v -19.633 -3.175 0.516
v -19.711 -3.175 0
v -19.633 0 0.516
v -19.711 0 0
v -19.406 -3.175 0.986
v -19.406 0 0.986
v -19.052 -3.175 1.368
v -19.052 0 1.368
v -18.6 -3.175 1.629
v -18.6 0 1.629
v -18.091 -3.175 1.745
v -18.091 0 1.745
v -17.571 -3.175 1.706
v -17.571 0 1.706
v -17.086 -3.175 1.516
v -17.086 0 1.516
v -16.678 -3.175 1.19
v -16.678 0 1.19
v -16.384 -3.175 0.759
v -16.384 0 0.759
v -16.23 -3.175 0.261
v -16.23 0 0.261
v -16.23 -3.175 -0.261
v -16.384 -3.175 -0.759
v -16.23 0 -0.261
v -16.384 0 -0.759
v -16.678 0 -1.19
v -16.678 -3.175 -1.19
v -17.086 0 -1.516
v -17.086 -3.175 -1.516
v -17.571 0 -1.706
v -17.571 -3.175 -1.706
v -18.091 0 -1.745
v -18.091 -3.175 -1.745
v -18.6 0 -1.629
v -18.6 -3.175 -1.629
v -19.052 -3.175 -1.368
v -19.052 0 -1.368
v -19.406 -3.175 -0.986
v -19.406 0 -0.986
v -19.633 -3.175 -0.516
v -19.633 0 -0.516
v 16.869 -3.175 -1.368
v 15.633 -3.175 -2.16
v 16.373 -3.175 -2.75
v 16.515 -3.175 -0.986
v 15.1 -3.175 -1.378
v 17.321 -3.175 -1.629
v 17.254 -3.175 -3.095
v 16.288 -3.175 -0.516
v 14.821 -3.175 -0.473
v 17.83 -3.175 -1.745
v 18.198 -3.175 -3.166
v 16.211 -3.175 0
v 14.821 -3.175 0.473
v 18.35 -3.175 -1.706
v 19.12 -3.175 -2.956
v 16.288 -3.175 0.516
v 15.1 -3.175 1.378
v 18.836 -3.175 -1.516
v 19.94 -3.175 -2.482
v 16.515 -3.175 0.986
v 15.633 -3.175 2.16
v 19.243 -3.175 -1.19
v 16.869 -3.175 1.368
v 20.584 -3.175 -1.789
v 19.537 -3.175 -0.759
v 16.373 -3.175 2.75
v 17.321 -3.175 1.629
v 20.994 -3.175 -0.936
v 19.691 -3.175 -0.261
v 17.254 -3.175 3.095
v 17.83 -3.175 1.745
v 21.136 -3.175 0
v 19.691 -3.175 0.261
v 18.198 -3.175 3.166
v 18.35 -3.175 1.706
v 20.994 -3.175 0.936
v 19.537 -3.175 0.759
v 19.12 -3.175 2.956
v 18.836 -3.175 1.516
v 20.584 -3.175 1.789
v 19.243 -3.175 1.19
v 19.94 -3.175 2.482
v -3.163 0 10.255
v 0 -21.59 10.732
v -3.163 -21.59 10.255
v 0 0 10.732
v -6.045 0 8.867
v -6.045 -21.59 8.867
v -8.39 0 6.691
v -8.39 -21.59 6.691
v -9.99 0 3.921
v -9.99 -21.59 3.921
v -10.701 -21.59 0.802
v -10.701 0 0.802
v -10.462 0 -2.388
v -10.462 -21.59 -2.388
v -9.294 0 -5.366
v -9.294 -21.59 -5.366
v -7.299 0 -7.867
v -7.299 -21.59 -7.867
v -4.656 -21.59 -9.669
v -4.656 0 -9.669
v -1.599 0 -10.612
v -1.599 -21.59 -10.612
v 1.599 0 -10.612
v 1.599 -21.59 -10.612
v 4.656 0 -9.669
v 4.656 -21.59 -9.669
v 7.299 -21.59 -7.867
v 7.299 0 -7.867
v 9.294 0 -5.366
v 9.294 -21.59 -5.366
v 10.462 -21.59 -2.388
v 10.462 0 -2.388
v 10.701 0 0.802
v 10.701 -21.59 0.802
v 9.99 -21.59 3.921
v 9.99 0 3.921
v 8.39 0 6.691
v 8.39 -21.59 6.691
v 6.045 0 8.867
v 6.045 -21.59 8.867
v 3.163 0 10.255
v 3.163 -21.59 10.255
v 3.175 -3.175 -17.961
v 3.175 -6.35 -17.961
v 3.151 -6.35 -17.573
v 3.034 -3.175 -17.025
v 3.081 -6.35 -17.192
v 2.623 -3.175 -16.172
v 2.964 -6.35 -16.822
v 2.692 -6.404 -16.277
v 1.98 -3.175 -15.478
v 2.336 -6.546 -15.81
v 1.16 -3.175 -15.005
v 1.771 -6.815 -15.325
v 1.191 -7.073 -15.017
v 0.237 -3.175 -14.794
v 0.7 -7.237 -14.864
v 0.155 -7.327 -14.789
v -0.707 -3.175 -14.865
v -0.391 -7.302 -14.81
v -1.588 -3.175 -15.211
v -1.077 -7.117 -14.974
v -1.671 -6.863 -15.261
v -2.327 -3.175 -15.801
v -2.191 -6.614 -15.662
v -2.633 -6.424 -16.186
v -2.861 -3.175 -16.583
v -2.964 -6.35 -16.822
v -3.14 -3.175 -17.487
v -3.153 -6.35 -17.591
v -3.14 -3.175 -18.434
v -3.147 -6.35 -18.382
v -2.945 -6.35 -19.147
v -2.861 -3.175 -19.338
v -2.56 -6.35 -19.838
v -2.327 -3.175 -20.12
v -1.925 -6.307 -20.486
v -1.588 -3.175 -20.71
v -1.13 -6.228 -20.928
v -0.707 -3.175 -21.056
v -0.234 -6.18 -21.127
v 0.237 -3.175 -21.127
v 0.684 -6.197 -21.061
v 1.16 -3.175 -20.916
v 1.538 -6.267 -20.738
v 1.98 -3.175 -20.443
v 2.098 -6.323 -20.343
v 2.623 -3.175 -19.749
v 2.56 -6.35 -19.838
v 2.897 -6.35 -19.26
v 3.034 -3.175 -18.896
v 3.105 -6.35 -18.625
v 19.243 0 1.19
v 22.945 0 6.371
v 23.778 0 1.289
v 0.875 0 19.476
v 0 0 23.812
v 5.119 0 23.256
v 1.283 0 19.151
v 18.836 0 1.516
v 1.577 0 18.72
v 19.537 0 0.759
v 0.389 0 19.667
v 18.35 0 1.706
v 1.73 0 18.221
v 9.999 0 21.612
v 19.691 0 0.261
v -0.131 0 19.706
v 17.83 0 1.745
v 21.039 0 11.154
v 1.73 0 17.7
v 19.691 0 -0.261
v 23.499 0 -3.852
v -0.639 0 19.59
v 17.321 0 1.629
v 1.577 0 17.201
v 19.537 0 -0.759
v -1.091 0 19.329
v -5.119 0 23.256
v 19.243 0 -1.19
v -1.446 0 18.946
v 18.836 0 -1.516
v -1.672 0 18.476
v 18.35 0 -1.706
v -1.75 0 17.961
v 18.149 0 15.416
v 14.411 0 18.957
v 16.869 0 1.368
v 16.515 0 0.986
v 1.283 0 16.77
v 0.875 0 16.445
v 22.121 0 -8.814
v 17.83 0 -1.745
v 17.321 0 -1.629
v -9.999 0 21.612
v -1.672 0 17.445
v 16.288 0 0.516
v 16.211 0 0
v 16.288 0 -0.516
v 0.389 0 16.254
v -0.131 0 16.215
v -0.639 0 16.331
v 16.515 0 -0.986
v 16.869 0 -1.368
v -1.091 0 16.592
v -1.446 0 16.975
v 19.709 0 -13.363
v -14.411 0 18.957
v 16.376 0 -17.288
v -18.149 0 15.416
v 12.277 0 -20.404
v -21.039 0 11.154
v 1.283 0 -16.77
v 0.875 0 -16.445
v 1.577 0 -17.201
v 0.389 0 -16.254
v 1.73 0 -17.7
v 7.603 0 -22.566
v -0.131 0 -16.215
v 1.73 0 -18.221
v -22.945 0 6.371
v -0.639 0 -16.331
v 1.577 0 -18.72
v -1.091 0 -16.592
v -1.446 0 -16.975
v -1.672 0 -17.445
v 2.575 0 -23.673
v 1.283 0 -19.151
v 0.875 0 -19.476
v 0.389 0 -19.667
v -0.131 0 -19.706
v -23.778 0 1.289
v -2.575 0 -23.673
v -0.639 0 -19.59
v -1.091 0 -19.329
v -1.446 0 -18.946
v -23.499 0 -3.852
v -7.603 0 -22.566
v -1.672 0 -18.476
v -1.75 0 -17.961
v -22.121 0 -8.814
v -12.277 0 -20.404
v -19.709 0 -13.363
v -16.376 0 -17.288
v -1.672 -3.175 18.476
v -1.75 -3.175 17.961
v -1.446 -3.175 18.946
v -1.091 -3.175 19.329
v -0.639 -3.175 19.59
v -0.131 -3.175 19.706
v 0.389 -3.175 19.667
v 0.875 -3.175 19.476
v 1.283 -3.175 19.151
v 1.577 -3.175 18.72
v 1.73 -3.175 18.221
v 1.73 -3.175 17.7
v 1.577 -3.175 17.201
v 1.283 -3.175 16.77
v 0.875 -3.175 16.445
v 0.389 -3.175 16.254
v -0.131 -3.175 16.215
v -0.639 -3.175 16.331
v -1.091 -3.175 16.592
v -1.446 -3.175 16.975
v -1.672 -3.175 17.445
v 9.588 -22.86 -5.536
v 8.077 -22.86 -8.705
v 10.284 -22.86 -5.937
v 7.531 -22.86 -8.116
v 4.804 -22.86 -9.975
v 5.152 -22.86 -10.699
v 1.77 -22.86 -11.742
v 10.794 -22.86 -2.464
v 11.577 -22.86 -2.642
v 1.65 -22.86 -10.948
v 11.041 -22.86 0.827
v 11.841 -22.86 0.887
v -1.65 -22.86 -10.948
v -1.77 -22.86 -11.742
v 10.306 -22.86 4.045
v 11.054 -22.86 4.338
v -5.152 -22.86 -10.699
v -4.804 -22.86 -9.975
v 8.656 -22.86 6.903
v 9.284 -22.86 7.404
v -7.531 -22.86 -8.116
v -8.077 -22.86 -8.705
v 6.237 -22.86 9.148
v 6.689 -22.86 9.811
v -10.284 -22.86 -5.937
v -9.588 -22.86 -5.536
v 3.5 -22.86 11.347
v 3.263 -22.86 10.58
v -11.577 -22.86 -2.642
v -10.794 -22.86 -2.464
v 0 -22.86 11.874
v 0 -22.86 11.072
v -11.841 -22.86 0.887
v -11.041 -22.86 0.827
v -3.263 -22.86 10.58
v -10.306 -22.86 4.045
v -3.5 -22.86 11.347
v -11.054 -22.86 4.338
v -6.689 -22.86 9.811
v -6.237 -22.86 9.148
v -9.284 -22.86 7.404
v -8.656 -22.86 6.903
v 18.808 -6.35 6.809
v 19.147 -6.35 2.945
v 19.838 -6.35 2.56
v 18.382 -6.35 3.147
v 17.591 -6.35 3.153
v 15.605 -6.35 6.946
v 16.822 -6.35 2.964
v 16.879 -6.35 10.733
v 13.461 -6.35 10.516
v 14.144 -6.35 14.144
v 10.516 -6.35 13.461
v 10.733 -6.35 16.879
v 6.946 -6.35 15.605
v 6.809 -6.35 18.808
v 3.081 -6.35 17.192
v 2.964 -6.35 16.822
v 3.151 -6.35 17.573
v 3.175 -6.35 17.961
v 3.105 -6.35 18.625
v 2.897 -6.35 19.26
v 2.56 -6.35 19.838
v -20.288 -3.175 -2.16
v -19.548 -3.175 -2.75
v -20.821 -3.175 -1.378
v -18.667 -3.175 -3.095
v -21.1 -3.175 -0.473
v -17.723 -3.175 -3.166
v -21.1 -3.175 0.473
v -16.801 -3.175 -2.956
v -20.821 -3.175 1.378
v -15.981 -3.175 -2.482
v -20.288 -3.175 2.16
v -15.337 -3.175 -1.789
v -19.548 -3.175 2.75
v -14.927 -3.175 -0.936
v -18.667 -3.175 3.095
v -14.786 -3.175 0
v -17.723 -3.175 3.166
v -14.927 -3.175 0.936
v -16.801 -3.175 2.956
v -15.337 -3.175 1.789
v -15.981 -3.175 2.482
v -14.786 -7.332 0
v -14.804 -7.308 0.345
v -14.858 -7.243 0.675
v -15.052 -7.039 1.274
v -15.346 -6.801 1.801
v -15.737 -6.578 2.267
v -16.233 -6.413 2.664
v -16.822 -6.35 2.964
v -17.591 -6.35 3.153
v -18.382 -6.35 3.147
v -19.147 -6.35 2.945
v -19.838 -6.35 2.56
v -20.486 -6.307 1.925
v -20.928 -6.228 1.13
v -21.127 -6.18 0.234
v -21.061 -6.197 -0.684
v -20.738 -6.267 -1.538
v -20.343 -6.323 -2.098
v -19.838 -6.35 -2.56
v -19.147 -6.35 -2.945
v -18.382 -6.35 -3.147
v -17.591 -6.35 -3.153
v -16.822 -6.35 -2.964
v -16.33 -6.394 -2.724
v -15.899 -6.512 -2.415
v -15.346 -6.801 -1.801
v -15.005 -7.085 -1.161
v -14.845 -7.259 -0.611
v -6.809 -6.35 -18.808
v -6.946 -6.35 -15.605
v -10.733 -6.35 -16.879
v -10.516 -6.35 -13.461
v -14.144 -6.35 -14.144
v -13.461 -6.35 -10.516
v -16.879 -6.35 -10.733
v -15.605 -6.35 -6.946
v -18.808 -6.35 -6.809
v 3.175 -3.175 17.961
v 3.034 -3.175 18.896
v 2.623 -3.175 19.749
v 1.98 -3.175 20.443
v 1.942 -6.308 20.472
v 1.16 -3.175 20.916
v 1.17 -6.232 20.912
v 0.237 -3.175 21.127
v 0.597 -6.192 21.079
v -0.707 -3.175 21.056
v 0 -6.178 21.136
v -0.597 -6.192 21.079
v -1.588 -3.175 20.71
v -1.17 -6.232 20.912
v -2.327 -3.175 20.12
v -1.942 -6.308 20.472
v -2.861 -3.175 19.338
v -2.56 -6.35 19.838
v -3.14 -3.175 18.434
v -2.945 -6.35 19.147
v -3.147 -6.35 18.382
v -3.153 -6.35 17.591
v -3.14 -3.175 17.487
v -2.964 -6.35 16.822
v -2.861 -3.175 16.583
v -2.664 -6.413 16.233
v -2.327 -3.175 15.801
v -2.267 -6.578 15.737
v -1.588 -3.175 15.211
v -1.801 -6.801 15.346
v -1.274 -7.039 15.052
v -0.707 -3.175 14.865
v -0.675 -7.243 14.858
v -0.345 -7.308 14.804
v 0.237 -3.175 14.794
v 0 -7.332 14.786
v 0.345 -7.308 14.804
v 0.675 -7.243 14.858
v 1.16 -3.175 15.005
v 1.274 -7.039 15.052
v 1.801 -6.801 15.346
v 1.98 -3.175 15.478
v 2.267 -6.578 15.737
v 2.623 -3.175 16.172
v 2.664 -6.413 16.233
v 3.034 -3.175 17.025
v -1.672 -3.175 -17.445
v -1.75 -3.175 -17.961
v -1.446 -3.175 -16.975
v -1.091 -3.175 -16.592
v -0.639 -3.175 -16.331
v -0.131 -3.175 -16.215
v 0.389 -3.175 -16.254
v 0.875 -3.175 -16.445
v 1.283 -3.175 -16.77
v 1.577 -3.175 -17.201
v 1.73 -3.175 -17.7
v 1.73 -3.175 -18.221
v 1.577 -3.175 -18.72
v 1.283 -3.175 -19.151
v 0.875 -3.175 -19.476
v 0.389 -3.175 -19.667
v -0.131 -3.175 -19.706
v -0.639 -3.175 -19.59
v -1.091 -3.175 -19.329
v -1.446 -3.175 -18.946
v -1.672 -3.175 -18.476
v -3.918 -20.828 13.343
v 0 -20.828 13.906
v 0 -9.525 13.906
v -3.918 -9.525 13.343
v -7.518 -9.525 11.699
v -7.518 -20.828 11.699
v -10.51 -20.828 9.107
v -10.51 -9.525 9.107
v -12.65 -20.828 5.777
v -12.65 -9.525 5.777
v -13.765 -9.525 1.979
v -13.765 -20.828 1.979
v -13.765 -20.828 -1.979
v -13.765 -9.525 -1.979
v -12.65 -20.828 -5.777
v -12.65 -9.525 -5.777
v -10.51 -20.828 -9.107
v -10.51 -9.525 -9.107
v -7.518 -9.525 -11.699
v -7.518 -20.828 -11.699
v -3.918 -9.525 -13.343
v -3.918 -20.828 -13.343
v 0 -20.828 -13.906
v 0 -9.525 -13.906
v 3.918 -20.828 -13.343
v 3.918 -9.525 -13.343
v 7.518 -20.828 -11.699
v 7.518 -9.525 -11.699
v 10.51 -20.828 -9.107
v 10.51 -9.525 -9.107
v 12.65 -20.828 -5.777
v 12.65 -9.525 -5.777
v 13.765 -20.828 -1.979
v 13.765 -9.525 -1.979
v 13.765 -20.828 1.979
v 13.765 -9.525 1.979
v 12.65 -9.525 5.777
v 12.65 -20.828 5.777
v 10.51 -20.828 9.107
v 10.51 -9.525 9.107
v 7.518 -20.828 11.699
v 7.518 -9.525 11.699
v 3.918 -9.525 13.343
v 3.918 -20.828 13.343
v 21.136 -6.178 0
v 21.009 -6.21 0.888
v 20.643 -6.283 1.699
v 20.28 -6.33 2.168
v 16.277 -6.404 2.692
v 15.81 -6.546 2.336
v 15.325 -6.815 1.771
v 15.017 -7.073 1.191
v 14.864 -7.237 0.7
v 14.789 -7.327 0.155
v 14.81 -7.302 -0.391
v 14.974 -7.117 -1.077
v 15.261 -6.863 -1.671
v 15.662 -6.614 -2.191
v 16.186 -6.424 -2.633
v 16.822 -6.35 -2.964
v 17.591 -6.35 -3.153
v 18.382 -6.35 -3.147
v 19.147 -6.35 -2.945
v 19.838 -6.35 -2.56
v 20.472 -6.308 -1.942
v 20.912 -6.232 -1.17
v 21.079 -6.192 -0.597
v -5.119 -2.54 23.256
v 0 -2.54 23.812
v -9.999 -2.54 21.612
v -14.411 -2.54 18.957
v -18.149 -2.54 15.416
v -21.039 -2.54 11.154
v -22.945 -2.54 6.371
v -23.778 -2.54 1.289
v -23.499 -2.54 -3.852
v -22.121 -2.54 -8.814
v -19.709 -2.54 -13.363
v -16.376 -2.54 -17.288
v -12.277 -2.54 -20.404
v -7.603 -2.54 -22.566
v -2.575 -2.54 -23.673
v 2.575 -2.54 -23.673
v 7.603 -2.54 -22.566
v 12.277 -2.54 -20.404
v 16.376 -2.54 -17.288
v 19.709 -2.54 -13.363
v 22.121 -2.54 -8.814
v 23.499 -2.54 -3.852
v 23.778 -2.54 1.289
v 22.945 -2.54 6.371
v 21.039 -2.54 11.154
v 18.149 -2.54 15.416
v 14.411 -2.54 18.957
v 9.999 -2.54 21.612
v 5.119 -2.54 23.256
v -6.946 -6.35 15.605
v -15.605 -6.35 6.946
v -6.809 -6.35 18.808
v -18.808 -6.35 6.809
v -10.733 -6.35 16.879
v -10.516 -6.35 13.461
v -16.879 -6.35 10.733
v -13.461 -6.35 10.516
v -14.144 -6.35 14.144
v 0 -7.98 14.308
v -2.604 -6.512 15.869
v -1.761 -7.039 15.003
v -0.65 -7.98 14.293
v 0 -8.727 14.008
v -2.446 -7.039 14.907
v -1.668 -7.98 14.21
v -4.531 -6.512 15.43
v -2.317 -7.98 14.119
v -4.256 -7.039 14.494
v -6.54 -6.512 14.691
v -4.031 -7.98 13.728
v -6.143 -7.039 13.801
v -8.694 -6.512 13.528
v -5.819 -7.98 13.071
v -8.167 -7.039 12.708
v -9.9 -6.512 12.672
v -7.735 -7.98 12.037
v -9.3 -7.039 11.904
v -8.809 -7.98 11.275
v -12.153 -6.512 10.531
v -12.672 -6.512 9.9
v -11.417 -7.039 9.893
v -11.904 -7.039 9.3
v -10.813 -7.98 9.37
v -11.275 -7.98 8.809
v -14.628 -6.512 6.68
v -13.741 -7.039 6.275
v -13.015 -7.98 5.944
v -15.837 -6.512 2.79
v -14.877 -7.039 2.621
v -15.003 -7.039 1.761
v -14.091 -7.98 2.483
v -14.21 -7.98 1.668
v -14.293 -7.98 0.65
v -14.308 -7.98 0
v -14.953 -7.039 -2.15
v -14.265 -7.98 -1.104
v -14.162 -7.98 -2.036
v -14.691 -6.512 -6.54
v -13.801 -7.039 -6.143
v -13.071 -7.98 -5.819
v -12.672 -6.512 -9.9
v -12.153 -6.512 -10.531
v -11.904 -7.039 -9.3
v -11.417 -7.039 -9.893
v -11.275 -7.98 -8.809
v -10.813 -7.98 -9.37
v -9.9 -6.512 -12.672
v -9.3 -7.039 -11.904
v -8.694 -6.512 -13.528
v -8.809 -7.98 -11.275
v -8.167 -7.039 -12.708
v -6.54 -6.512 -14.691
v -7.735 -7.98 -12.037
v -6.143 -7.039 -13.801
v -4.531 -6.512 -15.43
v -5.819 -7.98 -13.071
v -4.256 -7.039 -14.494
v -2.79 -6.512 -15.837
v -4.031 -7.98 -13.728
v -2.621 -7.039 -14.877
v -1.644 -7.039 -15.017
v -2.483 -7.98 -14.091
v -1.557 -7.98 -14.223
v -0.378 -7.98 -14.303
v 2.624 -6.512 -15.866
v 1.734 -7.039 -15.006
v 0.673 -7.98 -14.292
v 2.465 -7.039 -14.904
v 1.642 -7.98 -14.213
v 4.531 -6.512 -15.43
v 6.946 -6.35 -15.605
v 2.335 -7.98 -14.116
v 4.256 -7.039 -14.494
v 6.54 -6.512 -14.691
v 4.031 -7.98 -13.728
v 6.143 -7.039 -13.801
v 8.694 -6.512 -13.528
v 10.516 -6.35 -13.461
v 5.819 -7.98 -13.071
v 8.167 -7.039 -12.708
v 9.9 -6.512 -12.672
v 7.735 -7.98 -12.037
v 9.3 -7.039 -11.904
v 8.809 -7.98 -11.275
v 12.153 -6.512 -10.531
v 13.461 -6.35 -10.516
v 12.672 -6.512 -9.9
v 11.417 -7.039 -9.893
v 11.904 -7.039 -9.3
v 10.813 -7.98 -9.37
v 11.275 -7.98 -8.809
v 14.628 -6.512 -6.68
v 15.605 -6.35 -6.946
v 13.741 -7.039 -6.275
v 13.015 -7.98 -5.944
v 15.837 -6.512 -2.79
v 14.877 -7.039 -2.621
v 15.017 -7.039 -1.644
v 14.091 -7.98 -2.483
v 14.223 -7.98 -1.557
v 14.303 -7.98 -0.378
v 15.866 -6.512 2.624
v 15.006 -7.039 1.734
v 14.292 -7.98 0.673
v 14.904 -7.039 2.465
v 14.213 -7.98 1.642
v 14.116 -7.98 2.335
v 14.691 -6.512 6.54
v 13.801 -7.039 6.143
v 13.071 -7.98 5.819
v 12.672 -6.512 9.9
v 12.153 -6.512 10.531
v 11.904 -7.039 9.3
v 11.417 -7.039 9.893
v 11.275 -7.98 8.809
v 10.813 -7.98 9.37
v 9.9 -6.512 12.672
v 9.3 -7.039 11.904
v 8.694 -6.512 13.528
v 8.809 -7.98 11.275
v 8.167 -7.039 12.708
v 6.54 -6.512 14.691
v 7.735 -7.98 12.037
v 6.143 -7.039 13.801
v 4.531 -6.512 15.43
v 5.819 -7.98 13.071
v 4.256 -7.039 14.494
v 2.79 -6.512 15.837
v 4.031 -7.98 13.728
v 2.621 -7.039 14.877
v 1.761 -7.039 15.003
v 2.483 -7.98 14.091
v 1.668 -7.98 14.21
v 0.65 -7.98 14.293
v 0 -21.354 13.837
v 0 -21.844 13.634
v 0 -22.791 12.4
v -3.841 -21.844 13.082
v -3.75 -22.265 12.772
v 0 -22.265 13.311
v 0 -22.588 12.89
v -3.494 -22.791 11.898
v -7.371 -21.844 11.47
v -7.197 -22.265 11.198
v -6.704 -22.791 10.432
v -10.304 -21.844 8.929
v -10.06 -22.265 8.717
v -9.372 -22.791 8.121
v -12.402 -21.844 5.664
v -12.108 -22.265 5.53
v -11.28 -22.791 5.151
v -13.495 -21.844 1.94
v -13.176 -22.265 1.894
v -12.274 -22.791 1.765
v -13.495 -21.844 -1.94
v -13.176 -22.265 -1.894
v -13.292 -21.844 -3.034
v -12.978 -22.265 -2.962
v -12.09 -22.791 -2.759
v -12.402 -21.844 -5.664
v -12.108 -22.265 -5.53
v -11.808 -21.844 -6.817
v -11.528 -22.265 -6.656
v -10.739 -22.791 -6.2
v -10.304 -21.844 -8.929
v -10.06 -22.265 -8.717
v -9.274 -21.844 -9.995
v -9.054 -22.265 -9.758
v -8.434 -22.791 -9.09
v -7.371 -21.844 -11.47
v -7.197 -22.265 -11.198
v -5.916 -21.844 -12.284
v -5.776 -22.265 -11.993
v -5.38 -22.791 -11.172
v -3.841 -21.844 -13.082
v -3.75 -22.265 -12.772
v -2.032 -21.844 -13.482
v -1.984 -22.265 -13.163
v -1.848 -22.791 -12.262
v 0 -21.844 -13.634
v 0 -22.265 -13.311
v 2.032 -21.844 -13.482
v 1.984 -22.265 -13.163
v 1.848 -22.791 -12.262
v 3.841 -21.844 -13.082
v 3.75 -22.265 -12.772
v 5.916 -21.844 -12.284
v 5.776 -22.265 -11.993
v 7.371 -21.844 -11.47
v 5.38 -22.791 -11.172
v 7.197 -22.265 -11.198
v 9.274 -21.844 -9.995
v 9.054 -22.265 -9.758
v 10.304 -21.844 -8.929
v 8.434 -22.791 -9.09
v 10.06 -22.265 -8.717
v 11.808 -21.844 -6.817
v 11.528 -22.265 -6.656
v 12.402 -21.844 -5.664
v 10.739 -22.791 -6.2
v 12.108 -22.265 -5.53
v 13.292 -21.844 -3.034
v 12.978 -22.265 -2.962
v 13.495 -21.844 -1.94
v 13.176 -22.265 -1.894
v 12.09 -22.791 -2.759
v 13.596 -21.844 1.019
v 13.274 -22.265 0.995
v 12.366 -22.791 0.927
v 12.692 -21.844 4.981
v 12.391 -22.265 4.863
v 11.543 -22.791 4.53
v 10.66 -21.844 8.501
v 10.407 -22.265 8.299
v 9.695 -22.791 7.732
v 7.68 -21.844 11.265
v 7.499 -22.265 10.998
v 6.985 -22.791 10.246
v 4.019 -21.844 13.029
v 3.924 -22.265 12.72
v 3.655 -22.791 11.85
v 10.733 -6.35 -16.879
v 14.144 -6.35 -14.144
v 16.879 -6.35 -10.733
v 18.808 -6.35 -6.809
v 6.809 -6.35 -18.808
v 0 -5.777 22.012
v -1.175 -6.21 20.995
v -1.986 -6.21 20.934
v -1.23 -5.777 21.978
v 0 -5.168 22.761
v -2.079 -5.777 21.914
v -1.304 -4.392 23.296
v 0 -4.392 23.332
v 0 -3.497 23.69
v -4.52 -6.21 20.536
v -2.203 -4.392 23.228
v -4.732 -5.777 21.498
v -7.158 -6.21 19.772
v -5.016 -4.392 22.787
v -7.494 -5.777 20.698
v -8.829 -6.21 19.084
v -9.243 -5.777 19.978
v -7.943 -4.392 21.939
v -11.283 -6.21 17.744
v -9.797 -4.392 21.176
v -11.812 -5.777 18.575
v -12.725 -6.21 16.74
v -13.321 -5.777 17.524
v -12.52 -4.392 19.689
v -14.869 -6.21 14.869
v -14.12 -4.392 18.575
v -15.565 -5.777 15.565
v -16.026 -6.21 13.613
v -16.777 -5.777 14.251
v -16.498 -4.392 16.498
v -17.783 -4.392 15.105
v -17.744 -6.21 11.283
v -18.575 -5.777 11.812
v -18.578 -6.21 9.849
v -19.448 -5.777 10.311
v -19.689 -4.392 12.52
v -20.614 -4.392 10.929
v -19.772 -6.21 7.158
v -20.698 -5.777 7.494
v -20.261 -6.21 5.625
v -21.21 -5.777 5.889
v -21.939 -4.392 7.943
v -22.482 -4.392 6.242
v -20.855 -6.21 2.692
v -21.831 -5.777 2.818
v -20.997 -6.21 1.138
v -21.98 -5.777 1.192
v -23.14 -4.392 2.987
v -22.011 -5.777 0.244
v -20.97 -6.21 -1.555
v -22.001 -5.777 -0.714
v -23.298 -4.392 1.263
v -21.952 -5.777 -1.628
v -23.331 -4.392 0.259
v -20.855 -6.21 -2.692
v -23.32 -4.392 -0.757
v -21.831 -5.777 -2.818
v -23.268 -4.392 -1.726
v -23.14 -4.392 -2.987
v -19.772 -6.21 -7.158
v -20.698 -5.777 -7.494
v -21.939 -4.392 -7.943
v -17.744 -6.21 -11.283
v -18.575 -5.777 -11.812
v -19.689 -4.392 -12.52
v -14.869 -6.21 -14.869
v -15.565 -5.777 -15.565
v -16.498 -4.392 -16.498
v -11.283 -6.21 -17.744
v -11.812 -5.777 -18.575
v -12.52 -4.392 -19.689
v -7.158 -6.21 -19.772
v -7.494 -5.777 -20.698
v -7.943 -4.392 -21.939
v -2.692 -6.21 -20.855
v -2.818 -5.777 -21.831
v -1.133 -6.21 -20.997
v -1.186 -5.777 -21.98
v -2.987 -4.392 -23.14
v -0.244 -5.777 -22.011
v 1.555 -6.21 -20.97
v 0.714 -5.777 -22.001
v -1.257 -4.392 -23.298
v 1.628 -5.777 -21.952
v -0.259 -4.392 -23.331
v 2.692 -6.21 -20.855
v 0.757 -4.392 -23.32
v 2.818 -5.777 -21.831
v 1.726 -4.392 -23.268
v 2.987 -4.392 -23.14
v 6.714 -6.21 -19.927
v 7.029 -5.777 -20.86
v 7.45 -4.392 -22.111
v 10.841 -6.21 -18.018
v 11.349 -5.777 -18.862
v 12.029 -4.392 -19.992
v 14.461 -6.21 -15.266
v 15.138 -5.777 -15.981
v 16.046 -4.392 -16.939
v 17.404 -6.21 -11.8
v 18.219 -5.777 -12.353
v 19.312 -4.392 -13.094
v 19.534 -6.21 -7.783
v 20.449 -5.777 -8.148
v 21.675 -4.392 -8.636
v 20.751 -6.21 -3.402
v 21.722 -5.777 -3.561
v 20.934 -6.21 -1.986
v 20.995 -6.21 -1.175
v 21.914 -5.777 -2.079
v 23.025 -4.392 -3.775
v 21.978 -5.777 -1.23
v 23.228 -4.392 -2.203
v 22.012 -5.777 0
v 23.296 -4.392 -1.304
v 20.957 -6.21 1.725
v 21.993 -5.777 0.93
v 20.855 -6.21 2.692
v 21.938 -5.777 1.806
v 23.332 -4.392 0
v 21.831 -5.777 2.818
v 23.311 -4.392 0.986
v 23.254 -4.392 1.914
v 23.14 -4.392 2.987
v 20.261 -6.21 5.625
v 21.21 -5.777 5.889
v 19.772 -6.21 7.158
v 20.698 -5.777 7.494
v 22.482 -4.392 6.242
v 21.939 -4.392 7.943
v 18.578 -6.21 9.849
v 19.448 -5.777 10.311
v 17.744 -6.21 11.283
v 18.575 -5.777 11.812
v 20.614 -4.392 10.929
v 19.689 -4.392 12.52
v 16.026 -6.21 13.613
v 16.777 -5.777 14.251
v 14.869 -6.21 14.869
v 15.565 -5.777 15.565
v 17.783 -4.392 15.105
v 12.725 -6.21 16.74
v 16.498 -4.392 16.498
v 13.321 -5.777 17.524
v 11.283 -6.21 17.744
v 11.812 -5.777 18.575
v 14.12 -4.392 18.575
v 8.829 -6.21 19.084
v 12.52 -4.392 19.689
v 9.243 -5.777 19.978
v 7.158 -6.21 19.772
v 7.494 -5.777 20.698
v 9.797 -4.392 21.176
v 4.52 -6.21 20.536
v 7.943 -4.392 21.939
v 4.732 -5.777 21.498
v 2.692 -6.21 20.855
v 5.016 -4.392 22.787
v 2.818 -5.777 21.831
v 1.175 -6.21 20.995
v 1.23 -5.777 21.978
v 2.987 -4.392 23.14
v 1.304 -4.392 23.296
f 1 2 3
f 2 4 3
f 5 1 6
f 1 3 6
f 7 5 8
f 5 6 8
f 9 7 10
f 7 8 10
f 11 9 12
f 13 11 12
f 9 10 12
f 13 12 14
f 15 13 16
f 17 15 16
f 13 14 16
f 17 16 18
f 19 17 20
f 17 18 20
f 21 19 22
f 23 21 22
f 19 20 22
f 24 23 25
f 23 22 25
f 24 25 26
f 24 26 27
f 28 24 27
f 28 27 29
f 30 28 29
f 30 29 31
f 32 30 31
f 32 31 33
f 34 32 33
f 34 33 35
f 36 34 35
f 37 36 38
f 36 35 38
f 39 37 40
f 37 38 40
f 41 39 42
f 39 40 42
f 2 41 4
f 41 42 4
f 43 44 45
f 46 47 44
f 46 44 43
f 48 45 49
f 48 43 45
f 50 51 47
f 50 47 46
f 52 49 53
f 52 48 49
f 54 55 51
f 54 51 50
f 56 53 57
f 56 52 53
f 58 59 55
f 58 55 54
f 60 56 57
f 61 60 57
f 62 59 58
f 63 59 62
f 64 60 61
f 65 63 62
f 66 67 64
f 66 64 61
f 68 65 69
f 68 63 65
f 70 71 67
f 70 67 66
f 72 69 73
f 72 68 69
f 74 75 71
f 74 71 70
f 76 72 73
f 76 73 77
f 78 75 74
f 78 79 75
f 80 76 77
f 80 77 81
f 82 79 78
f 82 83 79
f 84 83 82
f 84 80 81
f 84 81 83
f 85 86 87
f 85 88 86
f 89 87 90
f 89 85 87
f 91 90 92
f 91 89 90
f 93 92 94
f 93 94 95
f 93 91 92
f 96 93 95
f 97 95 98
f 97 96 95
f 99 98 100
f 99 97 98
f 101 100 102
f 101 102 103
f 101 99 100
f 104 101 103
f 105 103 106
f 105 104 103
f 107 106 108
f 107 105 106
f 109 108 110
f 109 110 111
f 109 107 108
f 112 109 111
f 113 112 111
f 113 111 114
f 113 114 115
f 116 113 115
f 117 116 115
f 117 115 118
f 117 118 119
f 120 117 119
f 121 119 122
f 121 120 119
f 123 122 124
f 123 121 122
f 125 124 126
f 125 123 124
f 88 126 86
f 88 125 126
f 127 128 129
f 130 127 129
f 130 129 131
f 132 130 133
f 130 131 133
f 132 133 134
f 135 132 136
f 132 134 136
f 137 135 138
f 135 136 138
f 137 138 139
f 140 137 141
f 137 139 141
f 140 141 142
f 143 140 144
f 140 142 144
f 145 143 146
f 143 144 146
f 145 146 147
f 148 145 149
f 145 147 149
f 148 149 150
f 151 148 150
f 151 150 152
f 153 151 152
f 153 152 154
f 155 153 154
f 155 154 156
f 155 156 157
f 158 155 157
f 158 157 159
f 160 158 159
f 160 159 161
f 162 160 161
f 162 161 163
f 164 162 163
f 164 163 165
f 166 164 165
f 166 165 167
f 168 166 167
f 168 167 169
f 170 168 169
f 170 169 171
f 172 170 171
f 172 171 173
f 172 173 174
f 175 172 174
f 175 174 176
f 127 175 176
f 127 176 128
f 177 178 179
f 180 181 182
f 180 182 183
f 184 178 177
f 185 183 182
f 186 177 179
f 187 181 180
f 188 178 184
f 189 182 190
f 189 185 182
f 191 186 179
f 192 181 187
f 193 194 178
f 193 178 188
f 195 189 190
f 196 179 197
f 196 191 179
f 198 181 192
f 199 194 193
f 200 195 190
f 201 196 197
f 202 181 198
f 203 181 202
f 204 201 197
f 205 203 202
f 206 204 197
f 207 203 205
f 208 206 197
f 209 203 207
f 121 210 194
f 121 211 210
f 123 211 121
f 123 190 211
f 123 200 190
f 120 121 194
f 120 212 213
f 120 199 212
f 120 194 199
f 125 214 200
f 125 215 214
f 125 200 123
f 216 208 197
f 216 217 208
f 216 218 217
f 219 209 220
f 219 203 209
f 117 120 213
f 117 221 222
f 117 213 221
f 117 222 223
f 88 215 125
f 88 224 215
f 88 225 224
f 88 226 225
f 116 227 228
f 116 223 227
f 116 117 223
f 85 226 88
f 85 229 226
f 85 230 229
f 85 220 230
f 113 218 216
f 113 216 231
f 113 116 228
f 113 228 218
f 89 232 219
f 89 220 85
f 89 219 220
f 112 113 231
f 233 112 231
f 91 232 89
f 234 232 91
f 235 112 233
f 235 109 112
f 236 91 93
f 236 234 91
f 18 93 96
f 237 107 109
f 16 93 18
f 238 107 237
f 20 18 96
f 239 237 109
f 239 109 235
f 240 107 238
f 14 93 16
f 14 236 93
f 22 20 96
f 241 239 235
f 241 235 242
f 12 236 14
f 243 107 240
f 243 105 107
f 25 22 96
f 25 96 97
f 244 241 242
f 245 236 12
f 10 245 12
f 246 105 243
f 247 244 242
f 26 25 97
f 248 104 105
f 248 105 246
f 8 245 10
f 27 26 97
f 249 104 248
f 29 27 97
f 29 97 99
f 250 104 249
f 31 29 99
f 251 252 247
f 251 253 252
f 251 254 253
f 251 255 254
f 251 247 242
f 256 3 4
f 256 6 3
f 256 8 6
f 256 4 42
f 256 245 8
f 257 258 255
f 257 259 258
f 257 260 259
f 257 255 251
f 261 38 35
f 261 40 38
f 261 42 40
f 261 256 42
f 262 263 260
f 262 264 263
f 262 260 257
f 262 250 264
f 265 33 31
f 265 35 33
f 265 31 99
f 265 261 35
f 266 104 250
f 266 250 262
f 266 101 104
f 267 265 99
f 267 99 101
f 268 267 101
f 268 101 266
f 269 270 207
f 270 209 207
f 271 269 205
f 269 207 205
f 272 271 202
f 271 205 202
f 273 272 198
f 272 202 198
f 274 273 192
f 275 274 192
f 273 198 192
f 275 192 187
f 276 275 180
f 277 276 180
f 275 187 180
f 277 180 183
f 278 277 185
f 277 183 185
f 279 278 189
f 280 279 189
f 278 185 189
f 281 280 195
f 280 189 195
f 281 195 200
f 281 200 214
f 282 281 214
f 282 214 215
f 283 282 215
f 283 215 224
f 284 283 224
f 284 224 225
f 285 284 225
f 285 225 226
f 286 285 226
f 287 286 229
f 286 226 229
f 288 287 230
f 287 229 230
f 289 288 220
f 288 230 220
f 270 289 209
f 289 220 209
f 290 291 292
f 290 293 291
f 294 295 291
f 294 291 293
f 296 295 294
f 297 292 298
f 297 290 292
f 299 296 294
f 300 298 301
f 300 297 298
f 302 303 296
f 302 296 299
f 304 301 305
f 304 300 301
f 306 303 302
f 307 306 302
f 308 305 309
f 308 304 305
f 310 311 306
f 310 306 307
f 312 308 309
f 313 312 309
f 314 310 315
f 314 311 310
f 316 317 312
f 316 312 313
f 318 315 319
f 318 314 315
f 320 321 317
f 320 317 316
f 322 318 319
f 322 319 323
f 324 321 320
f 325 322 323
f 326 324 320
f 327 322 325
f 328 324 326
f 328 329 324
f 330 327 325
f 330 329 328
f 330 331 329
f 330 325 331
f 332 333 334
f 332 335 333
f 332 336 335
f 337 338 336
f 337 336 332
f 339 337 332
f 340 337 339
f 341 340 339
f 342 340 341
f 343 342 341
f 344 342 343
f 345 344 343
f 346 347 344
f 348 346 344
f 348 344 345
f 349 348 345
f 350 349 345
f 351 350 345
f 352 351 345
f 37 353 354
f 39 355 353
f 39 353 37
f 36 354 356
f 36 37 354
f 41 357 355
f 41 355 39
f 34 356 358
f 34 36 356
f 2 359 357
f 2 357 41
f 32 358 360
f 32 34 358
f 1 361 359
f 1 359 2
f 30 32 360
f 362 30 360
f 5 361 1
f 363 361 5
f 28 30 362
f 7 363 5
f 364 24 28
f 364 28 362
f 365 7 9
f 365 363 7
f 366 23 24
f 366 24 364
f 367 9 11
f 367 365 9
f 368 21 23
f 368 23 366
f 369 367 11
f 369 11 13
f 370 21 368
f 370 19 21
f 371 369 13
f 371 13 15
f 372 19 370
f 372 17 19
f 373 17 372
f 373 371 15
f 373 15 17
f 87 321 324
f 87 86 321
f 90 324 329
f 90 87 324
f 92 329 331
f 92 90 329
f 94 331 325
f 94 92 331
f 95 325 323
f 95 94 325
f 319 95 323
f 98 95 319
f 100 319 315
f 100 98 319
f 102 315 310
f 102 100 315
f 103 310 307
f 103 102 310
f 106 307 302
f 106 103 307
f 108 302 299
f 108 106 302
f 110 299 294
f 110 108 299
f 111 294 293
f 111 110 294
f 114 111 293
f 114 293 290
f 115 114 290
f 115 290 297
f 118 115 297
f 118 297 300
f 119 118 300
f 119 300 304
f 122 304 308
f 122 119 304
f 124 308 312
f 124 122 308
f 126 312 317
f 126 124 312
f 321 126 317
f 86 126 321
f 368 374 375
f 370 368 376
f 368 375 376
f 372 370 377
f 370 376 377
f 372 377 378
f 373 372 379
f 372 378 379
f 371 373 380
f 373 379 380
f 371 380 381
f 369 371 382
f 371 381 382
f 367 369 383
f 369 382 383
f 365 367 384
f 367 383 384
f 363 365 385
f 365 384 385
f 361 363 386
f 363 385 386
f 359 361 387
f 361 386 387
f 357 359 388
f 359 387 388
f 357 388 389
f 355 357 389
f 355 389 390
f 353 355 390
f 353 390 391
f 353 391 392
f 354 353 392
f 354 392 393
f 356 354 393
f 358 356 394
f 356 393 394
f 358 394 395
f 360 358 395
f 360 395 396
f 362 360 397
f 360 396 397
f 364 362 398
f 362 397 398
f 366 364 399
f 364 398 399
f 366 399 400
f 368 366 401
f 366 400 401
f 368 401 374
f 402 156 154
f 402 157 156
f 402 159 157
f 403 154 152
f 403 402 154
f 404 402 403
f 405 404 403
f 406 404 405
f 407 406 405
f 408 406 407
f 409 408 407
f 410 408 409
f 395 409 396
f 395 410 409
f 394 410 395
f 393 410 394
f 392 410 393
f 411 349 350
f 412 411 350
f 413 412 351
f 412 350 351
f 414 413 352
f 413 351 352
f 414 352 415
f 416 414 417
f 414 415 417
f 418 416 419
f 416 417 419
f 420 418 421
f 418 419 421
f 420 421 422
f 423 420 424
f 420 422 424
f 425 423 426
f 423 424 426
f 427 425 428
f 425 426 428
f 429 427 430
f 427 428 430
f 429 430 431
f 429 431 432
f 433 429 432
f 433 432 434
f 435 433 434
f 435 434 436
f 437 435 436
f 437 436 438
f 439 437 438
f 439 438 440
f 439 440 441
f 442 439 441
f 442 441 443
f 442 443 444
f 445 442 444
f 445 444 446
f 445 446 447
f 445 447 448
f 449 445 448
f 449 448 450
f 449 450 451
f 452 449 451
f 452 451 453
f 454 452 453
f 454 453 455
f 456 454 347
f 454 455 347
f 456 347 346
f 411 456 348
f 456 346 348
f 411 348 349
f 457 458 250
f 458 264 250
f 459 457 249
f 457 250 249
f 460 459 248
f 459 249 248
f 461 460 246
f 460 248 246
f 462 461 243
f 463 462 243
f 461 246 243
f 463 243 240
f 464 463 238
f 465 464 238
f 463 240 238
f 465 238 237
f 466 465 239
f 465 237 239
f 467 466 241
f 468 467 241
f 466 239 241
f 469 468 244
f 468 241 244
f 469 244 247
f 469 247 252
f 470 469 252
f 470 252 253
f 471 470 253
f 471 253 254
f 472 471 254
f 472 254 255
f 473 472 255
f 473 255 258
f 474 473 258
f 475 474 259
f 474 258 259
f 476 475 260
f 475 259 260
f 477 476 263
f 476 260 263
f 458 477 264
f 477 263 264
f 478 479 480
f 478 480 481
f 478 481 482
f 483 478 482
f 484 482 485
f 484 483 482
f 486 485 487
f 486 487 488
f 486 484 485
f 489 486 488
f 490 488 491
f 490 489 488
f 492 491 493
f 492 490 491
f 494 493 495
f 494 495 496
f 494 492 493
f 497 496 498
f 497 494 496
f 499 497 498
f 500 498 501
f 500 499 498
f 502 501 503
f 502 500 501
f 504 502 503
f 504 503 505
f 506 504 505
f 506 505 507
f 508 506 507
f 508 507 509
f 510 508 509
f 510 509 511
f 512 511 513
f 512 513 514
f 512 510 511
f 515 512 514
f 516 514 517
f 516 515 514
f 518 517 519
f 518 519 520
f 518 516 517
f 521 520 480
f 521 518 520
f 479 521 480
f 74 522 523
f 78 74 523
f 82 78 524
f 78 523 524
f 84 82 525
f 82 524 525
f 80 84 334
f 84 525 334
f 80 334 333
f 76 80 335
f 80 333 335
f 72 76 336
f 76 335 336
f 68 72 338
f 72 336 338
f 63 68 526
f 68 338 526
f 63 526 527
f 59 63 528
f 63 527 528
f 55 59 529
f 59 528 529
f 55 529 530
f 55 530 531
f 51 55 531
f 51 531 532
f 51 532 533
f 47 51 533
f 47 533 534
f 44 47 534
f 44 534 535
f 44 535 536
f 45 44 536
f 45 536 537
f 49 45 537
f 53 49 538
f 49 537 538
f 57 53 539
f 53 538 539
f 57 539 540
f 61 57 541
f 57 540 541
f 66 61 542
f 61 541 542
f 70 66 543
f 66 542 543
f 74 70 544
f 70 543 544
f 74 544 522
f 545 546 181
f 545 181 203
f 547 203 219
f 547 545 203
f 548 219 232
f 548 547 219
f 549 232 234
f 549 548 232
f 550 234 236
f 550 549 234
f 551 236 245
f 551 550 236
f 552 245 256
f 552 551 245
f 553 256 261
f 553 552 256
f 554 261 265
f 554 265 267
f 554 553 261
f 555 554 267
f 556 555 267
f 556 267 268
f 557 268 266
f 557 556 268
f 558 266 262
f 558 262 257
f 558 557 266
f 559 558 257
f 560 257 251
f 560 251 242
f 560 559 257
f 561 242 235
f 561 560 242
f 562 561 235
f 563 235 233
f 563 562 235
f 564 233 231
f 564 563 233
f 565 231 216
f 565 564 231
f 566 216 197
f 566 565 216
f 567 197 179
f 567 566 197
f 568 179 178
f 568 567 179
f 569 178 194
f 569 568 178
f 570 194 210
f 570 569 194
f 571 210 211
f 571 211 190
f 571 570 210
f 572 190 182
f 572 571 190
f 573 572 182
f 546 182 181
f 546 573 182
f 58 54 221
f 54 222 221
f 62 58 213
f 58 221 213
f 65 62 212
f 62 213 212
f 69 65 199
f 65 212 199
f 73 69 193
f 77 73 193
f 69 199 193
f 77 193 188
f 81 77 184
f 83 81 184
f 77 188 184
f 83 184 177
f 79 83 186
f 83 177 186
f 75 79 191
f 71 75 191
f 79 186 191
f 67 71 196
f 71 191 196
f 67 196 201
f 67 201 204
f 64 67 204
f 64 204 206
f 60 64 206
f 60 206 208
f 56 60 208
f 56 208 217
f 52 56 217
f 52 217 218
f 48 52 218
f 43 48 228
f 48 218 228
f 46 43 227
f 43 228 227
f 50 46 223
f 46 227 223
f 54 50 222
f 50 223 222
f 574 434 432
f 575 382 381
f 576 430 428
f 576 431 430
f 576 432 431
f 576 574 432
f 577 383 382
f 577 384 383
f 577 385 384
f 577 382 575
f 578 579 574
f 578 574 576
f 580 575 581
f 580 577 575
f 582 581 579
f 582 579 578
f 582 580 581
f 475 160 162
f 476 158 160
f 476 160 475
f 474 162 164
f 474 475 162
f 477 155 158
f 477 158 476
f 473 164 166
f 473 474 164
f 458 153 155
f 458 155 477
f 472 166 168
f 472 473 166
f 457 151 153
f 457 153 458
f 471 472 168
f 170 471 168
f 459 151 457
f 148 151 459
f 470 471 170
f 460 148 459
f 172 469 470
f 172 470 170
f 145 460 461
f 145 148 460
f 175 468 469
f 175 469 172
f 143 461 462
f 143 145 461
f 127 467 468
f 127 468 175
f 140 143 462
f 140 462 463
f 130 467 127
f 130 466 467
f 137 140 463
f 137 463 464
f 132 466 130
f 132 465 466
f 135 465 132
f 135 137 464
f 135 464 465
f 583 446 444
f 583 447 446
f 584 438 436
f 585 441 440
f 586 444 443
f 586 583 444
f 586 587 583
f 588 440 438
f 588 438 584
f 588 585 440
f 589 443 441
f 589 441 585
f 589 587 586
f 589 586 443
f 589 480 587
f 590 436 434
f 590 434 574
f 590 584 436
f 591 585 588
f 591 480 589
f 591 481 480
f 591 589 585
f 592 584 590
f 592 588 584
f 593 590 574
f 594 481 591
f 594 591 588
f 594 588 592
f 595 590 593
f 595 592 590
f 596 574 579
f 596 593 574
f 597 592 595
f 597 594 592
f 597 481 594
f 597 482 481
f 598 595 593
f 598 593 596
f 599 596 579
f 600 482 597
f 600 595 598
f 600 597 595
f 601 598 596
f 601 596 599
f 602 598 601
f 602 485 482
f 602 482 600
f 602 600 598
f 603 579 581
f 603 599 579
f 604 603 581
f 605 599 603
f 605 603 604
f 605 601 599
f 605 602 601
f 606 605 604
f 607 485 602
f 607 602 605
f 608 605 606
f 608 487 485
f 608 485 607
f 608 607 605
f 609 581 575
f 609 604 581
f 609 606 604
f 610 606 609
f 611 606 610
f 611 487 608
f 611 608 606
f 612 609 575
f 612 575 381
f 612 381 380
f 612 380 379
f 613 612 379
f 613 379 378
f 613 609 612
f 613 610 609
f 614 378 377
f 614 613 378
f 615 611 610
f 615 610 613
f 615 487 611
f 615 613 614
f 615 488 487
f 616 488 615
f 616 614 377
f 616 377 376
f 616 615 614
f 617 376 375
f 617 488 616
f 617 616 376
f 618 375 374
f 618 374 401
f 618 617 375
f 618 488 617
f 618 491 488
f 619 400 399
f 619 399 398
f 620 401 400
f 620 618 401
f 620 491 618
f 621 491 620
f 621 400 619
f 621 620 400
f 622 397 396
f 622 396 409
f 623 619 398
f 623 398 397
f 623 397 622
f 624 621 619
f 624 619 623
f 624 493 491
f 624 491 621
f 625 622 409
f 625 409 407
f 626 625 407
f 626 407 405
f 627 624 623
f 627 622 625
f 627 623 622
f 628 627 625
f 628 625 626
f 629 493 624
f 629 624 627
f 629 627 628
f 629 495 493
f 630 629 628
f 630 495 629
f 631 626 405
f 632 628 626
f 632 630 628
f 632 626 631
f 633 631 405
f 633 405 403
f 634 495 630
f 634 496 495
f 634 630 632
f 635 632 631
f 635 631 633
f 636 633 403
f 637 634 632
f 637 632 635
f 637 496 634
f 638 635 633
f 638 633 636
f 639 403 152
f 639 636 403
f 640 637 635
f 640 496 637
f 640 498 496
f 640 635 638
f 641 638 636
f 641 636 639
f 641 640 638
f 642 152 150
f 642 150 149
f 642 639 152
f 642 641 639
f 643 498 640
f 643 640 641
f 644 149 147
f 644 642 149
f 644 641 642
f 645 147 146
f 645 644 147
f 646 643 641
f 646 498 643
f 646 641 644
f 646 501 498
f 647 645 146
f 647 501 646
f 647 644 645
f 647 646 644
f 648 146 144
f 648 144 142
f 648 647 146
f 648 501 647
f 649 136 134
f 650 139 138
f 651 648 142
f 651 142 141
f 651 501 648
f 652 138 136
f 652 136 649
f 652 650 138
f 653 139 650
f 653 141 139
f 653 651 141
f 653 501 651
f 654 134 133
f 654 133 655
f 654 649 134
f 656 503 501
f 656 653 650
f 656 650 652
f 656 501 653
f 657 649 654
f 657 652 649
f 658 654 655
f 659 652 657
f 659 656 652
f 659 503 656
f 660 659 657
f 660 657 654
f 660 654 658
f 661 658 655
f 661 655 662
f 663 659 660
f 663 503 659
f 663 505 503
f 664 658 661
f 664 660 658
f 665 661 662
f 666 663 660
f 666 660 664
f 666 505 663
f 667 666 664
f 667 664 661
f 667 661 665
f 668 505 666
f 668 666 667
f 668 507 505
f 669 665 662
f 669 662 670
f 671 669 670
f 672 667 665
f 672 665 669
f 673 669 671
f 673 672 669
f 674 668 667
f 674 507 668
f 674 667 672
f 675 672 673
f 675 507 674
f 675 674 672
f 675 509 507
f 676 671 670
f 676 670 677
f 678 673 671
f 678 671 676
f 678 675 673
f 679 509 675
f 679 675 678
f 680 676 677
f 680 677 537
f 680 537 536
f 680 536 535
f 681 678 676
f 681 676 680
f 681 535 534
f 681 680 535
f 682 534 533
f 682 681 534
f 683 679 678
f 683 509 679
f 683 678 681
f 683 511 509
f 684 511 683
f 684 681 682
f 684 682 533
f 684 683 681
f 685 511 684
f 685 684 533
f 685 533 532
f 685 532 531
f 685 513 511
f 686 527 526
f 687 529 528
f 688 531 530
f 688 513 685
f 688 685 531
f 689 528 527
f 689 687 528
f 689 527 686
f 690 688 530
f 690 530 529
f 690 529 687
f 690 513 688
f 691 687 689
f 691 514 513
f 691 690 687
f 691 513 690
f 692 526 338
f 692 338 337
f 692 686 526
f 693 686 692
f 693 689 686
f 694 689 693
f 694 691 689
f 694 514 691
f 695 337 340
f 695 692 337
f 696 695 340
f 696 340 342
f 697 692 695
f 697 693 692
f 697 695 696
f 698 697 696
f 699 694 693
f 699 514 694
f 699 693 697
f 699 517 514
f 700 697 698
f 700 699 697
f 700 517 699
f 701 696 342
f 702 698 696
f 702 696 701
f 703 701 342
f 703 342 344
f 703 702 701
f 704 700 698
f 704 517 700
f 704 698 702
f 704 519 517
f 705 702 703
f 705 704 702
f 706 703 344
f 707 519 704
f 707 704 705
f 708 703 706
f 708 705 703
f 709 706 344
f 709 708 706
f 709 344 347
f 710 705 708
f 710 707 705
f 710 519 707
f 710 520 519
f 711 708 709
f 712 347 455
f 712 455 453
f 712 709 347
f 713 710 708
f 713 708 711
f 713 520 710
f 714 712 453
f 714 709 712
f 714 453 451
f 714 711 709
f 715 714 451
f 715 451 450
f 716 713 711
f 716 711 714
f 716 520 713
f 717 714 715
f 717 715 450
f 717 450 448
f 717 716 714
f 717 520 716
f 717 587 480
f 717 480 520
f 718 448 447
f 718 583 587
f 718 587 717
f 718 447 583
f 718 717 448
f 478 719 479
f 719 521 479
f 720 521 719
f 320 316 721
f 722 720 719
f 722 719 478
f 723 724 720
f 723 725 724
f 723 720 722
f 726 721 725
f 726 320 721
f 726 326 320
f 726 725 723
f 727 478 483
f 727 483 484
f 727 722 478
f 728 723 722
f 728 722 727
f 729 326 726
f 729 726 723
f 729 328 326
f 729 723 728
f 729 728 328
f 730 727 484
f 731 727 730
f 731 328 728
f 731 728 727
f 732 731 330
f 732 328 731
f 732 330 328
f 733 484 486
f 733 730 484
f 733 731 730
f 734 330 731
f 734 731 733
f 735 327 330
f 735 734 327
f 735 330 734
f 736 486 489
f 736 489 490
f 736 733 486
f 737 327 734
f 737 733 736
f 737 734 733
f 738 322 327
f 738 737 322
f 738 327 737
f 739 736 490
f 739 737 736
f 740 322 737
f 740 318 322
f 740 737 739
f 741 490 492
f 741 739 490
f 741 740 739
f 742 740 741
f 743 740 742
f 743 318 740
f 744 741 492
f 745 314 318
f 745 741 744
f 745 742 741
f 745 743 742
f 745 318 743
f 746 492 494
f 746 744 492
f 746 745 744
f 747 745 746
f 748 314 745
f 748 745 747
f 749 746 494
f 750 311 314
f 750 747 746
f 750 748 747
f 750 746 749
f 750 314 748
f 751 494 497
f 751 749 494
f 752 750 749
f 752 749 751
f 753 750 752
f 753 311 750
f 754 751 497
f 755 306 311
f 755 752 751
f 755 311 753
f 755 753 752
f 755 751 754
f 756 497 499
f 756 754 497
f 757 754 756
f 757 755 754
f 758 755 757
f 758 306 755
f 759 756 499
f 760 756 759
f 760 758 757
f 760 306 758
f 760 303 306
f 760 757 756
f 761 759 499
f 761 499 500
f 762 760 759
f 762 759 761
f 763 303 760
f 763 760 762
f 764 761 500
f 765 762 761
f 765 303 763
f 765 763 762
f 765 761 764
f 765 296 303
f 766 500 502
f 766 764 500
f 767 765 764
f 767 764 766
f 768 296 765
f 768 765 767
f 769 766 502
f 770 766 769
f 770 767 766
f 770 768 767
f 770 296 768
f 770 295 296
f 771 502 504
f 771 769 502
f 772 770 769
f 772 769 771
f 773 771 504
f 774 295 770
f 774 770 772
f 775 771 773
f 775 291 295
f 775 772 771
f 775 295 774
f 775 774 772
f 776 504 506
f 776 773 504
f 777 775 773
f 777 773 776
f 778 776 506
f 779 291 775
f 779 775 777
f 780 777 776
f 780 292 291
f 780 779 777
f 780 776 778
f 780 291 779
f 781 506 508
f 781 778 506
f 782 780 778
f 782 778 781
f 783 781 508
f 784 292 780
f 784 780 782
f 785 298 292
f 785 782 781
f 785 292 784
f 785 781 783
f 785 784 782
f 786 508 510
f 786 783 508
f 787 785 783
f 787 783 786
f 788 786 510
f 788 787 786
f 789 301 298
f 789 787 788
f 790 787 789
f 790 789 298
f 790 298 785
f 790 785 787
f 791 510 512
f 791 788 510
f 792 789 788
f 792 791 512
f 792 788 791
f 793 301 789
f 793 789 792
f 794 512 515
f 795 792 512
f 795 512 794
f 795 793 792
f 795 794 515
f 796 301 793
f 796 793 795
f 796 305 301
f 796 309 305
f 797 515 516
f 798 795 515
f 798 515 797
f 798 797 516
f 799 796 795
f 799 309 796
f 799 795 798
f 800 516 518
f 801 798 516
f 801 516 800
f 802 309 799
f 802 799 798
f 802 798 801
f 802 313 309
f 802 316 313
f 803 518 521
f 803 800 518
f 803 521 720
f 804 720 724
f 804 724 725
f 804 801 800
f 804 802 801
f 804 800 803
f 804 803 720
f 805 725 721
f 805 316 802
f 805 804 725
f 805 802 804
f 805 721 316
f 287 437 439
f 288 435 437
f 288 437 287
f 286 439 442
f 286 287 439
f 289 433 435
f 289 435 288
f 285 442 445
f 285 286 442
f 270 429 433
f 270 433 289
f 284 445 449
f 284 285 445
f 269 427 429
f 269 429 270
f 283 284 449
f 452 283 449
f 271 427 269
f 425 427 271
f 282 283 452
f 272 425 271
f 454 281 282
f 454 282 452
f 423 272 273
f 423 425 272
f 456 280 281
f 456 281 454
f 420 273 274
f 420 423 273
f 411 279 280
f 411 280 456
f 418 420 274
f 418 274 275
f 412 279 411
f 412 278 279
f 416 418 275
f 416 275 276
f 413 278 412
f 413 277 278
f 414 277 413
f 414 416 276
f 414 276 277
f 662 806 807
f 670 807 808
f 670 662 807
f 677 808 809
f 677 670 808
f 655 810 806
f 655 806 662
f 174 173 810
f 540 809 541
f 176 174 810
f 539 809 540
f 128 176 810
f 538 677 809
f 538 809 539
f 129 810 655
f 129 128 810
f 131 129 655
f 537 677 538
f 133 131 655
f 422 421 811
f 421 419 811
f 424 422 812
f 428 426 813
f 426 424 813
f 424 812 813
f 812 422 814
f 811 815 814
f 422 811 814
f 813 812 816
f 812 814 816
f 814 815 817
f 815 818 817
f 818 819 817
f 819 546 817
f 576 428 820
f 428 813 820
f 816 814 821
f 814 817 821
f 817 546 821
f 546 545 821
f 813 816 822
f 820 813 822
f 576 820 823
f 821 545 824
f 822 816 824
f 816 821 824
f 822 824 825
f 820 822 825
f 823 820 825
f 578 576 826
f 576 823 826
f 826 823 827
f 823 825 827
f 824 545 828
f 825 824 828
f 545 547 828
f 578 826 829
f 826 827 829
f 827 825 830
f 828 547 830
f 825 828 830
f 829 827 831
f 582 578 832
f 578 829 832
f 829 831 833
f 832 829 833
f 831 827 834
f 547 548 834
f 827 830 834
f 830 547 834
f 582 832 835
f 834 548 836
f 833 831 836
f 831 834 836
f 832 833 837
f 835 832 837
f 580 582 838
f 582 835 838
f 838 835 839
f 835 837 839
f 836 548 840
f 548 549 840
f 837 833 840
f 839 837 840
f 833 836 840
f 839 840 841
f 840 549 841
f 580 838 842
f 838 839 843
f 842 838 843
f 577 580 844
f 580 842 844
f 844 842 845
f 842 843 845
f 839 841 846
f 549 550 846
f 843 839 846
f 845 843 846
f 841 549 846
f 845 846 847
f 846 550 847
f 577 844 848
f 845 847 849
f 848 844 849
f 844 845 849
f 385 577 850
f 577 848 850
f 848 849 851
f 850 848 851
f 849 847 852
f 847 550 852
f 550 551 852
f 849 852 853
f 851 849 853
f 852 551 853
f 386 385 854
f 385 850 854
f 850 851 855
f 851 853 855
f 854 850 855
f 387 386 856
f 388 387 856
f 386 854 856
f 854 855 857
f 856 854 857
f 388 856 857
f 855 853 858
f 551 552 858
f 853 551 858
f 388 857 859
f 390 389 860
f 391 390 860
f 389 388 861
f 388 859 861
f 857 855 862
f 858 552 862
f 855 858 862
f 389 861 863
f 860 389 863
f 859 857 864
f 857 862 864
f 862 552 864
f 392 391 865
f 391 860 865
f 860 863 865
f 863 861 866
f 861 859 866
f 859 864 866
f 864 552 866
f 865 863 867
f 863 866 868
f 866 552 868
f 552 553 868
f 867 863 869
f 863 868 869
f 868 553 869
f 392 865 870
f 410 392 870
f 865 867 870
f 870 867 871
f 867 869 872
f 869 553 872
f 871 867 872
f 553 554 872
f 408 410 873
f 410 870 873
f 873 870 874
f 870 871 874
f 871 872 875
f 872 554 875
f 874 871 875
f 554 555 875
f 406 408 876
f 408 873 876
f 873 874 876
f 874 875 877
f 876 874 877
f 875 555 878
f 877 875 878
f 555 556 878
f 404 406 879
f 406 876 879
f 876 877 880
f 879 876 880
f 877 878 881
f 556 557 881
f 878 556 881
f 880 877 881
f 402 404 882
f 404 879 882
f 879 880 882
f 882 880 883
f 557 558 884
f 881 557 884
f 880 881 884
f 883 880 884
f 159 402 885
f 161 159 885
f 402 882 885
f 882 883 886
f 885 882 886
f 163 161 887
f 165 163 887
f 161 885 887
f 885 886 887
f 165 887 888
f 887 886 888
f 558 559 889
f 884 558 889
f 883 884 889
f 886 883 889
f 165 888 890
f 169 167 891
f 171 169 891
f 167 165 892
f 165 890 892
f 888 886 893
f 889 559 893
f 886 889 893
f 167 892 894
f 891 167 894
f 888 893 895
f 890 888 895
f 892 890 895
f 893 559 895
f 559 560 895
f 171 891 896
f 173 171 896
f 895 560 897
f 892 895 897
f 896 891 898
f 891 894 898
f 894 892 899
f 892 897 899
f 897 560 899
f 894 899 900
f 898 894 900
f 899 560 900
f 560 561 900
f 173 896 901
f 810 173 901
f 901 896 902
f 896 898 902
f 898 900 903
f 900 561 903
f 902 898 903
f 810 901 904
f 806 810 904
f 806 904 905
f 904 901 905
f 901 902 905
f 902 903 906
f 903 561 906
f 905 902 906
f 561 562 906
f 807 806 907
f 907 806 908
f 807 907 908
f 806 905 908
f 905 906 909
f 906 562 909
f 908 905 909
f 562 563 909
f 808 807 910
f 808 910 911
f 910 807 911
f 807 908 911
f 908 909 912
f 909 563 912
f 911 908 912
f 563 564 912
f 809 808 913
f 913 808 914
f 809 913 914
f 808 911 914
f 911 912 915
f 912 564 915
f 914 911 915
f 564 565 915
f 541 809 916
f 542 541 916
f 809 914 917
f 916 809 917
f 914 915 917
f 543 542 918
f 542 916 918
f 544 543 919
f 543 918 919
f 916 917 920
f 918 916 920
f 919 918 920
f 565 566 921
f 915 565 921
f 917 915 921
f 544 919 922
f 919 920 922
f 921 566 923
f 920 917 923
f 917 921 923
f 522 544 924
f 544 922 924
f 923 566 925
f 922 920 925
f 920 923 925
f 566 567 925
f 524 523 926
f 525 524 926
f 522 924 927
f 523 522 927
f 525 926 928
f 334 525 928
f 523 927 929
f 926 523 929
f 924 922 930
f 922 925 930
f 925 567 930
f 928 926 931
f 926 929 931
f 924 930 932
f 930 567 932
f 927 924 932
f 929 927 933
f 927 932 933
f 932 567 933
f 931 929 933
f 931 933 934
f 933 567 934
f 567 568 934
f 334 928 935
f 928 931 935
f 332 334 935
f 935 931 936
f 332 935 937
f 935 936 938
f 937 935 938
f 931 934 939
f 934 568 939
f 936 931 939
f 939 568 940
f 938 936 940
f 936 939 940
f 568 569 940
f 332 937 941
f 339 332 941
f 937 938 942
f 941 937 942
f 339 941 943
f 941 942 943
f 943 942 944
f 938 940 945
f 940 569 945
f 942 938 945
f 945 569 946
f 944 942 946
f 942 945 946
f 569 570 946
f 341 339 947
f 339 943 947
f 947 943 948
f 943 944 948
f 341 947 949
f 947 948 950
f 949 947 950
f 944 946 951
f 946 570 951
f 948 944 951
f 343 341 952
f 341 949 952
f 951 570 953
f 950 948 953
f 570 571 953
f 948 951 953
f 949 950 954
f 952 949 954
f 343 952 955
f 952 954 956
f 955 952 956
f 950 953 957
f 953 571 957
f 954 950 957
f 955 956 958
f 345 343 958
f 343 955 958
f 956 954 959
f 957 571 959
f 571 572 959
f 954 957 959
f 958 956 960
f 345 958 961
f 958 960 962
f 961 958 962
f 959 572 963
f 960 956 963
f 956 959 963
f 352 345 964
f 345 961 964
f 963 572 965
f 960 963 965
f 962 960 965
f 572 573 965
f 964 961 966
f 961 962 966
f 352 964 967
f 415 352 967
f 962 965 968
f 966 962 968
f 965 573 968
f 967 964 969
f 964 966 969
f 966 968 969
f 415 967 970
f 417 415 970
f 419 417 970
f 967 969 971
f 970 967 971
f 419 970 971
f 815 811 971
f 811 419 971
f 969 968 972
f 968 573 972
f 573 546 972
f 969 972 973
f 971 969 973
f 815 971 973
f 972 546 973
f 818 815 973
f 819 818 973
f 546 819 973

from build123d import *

# Parameters (mm, degrees)
F2_R           = 2.032
F4_D           = 3.5
F4_CBORE_D     = 6.35
F4_CBORE_DEPTH = 19.685


# Not quite as in the source:
# - a fillet or chamfer that OpenCascade refuses, or shapes differently, is made with other operations: its cross-section is extruded or revolved along the edge and cut away or added


with BuildPart() as f1:
    # F0 (on Right) → F1 (revolve)
    with BuildSketch(Plane.YZ):
        with BuildLine():
            Line((-22.86, 11.0717954744), (-21.59, 10.7315))
            Line((-21.59, 10.7315), (0, 10.7315))
            Line((0, 10.7315), (0, 23.8125))
            Line((0, 23.8125), (-6.35, 23.8125))
            Line((-6.35, 23.8125), (-6.35, 17.0815))
            ThreePointArc((-6.35, 17.0815), (-7.2799359697, 14.8364359697), (-9.525, 13.9065))
            Line((-9.525, 13.9065), (-22.86, 13.9065))
            Line((-22.86, 13.9065), (-22.86, 11.0717954744))
        make_face()
    revolve(axis=Axis((0, -11.43, 0), (0, -1, 0)))

    # F2
    f2_edges = [f1.edges().sort_by_distance(p)[0] for p in [
        (0, -22.86, -13.9065),
    ]]
    fillet(f2_edges, radius=F2_R)

    # F4 (through all)
    with Locations(Plane.XZ.offset(22.86)):
        with Locations((-17.9605122421, 0), (0, 17.9605122421), (17.9605122421, 0), (0, -17.9605122421)):
            CounterBoreHole(F4_D / 2, F4_CBORE_D / 2, F4_CBORE_DEPTH)

    # F5: fillet of radius 3.81 on 1 edges, made by hand

    # F5_s1 → F5_t2 (revolve, cut)
    with BuildSketch(Plane.YZ):
        with BuildLine():
            ThreePointArc((-6.35, 20.0025), (-5.2340768363, 22.6965768363), (-2.54, 23.8125))
            Line((-2.54, 23.8125), (-6.35, 23.8125))
            Line((-6.35, 23.8125), (-6.35, 20.0025))
        make_face()
    revolve(axis=Axis((0, -6.35, 0), (0, -1, 0)), mode=Mode.SUBTRACT)


solid = f1.part
